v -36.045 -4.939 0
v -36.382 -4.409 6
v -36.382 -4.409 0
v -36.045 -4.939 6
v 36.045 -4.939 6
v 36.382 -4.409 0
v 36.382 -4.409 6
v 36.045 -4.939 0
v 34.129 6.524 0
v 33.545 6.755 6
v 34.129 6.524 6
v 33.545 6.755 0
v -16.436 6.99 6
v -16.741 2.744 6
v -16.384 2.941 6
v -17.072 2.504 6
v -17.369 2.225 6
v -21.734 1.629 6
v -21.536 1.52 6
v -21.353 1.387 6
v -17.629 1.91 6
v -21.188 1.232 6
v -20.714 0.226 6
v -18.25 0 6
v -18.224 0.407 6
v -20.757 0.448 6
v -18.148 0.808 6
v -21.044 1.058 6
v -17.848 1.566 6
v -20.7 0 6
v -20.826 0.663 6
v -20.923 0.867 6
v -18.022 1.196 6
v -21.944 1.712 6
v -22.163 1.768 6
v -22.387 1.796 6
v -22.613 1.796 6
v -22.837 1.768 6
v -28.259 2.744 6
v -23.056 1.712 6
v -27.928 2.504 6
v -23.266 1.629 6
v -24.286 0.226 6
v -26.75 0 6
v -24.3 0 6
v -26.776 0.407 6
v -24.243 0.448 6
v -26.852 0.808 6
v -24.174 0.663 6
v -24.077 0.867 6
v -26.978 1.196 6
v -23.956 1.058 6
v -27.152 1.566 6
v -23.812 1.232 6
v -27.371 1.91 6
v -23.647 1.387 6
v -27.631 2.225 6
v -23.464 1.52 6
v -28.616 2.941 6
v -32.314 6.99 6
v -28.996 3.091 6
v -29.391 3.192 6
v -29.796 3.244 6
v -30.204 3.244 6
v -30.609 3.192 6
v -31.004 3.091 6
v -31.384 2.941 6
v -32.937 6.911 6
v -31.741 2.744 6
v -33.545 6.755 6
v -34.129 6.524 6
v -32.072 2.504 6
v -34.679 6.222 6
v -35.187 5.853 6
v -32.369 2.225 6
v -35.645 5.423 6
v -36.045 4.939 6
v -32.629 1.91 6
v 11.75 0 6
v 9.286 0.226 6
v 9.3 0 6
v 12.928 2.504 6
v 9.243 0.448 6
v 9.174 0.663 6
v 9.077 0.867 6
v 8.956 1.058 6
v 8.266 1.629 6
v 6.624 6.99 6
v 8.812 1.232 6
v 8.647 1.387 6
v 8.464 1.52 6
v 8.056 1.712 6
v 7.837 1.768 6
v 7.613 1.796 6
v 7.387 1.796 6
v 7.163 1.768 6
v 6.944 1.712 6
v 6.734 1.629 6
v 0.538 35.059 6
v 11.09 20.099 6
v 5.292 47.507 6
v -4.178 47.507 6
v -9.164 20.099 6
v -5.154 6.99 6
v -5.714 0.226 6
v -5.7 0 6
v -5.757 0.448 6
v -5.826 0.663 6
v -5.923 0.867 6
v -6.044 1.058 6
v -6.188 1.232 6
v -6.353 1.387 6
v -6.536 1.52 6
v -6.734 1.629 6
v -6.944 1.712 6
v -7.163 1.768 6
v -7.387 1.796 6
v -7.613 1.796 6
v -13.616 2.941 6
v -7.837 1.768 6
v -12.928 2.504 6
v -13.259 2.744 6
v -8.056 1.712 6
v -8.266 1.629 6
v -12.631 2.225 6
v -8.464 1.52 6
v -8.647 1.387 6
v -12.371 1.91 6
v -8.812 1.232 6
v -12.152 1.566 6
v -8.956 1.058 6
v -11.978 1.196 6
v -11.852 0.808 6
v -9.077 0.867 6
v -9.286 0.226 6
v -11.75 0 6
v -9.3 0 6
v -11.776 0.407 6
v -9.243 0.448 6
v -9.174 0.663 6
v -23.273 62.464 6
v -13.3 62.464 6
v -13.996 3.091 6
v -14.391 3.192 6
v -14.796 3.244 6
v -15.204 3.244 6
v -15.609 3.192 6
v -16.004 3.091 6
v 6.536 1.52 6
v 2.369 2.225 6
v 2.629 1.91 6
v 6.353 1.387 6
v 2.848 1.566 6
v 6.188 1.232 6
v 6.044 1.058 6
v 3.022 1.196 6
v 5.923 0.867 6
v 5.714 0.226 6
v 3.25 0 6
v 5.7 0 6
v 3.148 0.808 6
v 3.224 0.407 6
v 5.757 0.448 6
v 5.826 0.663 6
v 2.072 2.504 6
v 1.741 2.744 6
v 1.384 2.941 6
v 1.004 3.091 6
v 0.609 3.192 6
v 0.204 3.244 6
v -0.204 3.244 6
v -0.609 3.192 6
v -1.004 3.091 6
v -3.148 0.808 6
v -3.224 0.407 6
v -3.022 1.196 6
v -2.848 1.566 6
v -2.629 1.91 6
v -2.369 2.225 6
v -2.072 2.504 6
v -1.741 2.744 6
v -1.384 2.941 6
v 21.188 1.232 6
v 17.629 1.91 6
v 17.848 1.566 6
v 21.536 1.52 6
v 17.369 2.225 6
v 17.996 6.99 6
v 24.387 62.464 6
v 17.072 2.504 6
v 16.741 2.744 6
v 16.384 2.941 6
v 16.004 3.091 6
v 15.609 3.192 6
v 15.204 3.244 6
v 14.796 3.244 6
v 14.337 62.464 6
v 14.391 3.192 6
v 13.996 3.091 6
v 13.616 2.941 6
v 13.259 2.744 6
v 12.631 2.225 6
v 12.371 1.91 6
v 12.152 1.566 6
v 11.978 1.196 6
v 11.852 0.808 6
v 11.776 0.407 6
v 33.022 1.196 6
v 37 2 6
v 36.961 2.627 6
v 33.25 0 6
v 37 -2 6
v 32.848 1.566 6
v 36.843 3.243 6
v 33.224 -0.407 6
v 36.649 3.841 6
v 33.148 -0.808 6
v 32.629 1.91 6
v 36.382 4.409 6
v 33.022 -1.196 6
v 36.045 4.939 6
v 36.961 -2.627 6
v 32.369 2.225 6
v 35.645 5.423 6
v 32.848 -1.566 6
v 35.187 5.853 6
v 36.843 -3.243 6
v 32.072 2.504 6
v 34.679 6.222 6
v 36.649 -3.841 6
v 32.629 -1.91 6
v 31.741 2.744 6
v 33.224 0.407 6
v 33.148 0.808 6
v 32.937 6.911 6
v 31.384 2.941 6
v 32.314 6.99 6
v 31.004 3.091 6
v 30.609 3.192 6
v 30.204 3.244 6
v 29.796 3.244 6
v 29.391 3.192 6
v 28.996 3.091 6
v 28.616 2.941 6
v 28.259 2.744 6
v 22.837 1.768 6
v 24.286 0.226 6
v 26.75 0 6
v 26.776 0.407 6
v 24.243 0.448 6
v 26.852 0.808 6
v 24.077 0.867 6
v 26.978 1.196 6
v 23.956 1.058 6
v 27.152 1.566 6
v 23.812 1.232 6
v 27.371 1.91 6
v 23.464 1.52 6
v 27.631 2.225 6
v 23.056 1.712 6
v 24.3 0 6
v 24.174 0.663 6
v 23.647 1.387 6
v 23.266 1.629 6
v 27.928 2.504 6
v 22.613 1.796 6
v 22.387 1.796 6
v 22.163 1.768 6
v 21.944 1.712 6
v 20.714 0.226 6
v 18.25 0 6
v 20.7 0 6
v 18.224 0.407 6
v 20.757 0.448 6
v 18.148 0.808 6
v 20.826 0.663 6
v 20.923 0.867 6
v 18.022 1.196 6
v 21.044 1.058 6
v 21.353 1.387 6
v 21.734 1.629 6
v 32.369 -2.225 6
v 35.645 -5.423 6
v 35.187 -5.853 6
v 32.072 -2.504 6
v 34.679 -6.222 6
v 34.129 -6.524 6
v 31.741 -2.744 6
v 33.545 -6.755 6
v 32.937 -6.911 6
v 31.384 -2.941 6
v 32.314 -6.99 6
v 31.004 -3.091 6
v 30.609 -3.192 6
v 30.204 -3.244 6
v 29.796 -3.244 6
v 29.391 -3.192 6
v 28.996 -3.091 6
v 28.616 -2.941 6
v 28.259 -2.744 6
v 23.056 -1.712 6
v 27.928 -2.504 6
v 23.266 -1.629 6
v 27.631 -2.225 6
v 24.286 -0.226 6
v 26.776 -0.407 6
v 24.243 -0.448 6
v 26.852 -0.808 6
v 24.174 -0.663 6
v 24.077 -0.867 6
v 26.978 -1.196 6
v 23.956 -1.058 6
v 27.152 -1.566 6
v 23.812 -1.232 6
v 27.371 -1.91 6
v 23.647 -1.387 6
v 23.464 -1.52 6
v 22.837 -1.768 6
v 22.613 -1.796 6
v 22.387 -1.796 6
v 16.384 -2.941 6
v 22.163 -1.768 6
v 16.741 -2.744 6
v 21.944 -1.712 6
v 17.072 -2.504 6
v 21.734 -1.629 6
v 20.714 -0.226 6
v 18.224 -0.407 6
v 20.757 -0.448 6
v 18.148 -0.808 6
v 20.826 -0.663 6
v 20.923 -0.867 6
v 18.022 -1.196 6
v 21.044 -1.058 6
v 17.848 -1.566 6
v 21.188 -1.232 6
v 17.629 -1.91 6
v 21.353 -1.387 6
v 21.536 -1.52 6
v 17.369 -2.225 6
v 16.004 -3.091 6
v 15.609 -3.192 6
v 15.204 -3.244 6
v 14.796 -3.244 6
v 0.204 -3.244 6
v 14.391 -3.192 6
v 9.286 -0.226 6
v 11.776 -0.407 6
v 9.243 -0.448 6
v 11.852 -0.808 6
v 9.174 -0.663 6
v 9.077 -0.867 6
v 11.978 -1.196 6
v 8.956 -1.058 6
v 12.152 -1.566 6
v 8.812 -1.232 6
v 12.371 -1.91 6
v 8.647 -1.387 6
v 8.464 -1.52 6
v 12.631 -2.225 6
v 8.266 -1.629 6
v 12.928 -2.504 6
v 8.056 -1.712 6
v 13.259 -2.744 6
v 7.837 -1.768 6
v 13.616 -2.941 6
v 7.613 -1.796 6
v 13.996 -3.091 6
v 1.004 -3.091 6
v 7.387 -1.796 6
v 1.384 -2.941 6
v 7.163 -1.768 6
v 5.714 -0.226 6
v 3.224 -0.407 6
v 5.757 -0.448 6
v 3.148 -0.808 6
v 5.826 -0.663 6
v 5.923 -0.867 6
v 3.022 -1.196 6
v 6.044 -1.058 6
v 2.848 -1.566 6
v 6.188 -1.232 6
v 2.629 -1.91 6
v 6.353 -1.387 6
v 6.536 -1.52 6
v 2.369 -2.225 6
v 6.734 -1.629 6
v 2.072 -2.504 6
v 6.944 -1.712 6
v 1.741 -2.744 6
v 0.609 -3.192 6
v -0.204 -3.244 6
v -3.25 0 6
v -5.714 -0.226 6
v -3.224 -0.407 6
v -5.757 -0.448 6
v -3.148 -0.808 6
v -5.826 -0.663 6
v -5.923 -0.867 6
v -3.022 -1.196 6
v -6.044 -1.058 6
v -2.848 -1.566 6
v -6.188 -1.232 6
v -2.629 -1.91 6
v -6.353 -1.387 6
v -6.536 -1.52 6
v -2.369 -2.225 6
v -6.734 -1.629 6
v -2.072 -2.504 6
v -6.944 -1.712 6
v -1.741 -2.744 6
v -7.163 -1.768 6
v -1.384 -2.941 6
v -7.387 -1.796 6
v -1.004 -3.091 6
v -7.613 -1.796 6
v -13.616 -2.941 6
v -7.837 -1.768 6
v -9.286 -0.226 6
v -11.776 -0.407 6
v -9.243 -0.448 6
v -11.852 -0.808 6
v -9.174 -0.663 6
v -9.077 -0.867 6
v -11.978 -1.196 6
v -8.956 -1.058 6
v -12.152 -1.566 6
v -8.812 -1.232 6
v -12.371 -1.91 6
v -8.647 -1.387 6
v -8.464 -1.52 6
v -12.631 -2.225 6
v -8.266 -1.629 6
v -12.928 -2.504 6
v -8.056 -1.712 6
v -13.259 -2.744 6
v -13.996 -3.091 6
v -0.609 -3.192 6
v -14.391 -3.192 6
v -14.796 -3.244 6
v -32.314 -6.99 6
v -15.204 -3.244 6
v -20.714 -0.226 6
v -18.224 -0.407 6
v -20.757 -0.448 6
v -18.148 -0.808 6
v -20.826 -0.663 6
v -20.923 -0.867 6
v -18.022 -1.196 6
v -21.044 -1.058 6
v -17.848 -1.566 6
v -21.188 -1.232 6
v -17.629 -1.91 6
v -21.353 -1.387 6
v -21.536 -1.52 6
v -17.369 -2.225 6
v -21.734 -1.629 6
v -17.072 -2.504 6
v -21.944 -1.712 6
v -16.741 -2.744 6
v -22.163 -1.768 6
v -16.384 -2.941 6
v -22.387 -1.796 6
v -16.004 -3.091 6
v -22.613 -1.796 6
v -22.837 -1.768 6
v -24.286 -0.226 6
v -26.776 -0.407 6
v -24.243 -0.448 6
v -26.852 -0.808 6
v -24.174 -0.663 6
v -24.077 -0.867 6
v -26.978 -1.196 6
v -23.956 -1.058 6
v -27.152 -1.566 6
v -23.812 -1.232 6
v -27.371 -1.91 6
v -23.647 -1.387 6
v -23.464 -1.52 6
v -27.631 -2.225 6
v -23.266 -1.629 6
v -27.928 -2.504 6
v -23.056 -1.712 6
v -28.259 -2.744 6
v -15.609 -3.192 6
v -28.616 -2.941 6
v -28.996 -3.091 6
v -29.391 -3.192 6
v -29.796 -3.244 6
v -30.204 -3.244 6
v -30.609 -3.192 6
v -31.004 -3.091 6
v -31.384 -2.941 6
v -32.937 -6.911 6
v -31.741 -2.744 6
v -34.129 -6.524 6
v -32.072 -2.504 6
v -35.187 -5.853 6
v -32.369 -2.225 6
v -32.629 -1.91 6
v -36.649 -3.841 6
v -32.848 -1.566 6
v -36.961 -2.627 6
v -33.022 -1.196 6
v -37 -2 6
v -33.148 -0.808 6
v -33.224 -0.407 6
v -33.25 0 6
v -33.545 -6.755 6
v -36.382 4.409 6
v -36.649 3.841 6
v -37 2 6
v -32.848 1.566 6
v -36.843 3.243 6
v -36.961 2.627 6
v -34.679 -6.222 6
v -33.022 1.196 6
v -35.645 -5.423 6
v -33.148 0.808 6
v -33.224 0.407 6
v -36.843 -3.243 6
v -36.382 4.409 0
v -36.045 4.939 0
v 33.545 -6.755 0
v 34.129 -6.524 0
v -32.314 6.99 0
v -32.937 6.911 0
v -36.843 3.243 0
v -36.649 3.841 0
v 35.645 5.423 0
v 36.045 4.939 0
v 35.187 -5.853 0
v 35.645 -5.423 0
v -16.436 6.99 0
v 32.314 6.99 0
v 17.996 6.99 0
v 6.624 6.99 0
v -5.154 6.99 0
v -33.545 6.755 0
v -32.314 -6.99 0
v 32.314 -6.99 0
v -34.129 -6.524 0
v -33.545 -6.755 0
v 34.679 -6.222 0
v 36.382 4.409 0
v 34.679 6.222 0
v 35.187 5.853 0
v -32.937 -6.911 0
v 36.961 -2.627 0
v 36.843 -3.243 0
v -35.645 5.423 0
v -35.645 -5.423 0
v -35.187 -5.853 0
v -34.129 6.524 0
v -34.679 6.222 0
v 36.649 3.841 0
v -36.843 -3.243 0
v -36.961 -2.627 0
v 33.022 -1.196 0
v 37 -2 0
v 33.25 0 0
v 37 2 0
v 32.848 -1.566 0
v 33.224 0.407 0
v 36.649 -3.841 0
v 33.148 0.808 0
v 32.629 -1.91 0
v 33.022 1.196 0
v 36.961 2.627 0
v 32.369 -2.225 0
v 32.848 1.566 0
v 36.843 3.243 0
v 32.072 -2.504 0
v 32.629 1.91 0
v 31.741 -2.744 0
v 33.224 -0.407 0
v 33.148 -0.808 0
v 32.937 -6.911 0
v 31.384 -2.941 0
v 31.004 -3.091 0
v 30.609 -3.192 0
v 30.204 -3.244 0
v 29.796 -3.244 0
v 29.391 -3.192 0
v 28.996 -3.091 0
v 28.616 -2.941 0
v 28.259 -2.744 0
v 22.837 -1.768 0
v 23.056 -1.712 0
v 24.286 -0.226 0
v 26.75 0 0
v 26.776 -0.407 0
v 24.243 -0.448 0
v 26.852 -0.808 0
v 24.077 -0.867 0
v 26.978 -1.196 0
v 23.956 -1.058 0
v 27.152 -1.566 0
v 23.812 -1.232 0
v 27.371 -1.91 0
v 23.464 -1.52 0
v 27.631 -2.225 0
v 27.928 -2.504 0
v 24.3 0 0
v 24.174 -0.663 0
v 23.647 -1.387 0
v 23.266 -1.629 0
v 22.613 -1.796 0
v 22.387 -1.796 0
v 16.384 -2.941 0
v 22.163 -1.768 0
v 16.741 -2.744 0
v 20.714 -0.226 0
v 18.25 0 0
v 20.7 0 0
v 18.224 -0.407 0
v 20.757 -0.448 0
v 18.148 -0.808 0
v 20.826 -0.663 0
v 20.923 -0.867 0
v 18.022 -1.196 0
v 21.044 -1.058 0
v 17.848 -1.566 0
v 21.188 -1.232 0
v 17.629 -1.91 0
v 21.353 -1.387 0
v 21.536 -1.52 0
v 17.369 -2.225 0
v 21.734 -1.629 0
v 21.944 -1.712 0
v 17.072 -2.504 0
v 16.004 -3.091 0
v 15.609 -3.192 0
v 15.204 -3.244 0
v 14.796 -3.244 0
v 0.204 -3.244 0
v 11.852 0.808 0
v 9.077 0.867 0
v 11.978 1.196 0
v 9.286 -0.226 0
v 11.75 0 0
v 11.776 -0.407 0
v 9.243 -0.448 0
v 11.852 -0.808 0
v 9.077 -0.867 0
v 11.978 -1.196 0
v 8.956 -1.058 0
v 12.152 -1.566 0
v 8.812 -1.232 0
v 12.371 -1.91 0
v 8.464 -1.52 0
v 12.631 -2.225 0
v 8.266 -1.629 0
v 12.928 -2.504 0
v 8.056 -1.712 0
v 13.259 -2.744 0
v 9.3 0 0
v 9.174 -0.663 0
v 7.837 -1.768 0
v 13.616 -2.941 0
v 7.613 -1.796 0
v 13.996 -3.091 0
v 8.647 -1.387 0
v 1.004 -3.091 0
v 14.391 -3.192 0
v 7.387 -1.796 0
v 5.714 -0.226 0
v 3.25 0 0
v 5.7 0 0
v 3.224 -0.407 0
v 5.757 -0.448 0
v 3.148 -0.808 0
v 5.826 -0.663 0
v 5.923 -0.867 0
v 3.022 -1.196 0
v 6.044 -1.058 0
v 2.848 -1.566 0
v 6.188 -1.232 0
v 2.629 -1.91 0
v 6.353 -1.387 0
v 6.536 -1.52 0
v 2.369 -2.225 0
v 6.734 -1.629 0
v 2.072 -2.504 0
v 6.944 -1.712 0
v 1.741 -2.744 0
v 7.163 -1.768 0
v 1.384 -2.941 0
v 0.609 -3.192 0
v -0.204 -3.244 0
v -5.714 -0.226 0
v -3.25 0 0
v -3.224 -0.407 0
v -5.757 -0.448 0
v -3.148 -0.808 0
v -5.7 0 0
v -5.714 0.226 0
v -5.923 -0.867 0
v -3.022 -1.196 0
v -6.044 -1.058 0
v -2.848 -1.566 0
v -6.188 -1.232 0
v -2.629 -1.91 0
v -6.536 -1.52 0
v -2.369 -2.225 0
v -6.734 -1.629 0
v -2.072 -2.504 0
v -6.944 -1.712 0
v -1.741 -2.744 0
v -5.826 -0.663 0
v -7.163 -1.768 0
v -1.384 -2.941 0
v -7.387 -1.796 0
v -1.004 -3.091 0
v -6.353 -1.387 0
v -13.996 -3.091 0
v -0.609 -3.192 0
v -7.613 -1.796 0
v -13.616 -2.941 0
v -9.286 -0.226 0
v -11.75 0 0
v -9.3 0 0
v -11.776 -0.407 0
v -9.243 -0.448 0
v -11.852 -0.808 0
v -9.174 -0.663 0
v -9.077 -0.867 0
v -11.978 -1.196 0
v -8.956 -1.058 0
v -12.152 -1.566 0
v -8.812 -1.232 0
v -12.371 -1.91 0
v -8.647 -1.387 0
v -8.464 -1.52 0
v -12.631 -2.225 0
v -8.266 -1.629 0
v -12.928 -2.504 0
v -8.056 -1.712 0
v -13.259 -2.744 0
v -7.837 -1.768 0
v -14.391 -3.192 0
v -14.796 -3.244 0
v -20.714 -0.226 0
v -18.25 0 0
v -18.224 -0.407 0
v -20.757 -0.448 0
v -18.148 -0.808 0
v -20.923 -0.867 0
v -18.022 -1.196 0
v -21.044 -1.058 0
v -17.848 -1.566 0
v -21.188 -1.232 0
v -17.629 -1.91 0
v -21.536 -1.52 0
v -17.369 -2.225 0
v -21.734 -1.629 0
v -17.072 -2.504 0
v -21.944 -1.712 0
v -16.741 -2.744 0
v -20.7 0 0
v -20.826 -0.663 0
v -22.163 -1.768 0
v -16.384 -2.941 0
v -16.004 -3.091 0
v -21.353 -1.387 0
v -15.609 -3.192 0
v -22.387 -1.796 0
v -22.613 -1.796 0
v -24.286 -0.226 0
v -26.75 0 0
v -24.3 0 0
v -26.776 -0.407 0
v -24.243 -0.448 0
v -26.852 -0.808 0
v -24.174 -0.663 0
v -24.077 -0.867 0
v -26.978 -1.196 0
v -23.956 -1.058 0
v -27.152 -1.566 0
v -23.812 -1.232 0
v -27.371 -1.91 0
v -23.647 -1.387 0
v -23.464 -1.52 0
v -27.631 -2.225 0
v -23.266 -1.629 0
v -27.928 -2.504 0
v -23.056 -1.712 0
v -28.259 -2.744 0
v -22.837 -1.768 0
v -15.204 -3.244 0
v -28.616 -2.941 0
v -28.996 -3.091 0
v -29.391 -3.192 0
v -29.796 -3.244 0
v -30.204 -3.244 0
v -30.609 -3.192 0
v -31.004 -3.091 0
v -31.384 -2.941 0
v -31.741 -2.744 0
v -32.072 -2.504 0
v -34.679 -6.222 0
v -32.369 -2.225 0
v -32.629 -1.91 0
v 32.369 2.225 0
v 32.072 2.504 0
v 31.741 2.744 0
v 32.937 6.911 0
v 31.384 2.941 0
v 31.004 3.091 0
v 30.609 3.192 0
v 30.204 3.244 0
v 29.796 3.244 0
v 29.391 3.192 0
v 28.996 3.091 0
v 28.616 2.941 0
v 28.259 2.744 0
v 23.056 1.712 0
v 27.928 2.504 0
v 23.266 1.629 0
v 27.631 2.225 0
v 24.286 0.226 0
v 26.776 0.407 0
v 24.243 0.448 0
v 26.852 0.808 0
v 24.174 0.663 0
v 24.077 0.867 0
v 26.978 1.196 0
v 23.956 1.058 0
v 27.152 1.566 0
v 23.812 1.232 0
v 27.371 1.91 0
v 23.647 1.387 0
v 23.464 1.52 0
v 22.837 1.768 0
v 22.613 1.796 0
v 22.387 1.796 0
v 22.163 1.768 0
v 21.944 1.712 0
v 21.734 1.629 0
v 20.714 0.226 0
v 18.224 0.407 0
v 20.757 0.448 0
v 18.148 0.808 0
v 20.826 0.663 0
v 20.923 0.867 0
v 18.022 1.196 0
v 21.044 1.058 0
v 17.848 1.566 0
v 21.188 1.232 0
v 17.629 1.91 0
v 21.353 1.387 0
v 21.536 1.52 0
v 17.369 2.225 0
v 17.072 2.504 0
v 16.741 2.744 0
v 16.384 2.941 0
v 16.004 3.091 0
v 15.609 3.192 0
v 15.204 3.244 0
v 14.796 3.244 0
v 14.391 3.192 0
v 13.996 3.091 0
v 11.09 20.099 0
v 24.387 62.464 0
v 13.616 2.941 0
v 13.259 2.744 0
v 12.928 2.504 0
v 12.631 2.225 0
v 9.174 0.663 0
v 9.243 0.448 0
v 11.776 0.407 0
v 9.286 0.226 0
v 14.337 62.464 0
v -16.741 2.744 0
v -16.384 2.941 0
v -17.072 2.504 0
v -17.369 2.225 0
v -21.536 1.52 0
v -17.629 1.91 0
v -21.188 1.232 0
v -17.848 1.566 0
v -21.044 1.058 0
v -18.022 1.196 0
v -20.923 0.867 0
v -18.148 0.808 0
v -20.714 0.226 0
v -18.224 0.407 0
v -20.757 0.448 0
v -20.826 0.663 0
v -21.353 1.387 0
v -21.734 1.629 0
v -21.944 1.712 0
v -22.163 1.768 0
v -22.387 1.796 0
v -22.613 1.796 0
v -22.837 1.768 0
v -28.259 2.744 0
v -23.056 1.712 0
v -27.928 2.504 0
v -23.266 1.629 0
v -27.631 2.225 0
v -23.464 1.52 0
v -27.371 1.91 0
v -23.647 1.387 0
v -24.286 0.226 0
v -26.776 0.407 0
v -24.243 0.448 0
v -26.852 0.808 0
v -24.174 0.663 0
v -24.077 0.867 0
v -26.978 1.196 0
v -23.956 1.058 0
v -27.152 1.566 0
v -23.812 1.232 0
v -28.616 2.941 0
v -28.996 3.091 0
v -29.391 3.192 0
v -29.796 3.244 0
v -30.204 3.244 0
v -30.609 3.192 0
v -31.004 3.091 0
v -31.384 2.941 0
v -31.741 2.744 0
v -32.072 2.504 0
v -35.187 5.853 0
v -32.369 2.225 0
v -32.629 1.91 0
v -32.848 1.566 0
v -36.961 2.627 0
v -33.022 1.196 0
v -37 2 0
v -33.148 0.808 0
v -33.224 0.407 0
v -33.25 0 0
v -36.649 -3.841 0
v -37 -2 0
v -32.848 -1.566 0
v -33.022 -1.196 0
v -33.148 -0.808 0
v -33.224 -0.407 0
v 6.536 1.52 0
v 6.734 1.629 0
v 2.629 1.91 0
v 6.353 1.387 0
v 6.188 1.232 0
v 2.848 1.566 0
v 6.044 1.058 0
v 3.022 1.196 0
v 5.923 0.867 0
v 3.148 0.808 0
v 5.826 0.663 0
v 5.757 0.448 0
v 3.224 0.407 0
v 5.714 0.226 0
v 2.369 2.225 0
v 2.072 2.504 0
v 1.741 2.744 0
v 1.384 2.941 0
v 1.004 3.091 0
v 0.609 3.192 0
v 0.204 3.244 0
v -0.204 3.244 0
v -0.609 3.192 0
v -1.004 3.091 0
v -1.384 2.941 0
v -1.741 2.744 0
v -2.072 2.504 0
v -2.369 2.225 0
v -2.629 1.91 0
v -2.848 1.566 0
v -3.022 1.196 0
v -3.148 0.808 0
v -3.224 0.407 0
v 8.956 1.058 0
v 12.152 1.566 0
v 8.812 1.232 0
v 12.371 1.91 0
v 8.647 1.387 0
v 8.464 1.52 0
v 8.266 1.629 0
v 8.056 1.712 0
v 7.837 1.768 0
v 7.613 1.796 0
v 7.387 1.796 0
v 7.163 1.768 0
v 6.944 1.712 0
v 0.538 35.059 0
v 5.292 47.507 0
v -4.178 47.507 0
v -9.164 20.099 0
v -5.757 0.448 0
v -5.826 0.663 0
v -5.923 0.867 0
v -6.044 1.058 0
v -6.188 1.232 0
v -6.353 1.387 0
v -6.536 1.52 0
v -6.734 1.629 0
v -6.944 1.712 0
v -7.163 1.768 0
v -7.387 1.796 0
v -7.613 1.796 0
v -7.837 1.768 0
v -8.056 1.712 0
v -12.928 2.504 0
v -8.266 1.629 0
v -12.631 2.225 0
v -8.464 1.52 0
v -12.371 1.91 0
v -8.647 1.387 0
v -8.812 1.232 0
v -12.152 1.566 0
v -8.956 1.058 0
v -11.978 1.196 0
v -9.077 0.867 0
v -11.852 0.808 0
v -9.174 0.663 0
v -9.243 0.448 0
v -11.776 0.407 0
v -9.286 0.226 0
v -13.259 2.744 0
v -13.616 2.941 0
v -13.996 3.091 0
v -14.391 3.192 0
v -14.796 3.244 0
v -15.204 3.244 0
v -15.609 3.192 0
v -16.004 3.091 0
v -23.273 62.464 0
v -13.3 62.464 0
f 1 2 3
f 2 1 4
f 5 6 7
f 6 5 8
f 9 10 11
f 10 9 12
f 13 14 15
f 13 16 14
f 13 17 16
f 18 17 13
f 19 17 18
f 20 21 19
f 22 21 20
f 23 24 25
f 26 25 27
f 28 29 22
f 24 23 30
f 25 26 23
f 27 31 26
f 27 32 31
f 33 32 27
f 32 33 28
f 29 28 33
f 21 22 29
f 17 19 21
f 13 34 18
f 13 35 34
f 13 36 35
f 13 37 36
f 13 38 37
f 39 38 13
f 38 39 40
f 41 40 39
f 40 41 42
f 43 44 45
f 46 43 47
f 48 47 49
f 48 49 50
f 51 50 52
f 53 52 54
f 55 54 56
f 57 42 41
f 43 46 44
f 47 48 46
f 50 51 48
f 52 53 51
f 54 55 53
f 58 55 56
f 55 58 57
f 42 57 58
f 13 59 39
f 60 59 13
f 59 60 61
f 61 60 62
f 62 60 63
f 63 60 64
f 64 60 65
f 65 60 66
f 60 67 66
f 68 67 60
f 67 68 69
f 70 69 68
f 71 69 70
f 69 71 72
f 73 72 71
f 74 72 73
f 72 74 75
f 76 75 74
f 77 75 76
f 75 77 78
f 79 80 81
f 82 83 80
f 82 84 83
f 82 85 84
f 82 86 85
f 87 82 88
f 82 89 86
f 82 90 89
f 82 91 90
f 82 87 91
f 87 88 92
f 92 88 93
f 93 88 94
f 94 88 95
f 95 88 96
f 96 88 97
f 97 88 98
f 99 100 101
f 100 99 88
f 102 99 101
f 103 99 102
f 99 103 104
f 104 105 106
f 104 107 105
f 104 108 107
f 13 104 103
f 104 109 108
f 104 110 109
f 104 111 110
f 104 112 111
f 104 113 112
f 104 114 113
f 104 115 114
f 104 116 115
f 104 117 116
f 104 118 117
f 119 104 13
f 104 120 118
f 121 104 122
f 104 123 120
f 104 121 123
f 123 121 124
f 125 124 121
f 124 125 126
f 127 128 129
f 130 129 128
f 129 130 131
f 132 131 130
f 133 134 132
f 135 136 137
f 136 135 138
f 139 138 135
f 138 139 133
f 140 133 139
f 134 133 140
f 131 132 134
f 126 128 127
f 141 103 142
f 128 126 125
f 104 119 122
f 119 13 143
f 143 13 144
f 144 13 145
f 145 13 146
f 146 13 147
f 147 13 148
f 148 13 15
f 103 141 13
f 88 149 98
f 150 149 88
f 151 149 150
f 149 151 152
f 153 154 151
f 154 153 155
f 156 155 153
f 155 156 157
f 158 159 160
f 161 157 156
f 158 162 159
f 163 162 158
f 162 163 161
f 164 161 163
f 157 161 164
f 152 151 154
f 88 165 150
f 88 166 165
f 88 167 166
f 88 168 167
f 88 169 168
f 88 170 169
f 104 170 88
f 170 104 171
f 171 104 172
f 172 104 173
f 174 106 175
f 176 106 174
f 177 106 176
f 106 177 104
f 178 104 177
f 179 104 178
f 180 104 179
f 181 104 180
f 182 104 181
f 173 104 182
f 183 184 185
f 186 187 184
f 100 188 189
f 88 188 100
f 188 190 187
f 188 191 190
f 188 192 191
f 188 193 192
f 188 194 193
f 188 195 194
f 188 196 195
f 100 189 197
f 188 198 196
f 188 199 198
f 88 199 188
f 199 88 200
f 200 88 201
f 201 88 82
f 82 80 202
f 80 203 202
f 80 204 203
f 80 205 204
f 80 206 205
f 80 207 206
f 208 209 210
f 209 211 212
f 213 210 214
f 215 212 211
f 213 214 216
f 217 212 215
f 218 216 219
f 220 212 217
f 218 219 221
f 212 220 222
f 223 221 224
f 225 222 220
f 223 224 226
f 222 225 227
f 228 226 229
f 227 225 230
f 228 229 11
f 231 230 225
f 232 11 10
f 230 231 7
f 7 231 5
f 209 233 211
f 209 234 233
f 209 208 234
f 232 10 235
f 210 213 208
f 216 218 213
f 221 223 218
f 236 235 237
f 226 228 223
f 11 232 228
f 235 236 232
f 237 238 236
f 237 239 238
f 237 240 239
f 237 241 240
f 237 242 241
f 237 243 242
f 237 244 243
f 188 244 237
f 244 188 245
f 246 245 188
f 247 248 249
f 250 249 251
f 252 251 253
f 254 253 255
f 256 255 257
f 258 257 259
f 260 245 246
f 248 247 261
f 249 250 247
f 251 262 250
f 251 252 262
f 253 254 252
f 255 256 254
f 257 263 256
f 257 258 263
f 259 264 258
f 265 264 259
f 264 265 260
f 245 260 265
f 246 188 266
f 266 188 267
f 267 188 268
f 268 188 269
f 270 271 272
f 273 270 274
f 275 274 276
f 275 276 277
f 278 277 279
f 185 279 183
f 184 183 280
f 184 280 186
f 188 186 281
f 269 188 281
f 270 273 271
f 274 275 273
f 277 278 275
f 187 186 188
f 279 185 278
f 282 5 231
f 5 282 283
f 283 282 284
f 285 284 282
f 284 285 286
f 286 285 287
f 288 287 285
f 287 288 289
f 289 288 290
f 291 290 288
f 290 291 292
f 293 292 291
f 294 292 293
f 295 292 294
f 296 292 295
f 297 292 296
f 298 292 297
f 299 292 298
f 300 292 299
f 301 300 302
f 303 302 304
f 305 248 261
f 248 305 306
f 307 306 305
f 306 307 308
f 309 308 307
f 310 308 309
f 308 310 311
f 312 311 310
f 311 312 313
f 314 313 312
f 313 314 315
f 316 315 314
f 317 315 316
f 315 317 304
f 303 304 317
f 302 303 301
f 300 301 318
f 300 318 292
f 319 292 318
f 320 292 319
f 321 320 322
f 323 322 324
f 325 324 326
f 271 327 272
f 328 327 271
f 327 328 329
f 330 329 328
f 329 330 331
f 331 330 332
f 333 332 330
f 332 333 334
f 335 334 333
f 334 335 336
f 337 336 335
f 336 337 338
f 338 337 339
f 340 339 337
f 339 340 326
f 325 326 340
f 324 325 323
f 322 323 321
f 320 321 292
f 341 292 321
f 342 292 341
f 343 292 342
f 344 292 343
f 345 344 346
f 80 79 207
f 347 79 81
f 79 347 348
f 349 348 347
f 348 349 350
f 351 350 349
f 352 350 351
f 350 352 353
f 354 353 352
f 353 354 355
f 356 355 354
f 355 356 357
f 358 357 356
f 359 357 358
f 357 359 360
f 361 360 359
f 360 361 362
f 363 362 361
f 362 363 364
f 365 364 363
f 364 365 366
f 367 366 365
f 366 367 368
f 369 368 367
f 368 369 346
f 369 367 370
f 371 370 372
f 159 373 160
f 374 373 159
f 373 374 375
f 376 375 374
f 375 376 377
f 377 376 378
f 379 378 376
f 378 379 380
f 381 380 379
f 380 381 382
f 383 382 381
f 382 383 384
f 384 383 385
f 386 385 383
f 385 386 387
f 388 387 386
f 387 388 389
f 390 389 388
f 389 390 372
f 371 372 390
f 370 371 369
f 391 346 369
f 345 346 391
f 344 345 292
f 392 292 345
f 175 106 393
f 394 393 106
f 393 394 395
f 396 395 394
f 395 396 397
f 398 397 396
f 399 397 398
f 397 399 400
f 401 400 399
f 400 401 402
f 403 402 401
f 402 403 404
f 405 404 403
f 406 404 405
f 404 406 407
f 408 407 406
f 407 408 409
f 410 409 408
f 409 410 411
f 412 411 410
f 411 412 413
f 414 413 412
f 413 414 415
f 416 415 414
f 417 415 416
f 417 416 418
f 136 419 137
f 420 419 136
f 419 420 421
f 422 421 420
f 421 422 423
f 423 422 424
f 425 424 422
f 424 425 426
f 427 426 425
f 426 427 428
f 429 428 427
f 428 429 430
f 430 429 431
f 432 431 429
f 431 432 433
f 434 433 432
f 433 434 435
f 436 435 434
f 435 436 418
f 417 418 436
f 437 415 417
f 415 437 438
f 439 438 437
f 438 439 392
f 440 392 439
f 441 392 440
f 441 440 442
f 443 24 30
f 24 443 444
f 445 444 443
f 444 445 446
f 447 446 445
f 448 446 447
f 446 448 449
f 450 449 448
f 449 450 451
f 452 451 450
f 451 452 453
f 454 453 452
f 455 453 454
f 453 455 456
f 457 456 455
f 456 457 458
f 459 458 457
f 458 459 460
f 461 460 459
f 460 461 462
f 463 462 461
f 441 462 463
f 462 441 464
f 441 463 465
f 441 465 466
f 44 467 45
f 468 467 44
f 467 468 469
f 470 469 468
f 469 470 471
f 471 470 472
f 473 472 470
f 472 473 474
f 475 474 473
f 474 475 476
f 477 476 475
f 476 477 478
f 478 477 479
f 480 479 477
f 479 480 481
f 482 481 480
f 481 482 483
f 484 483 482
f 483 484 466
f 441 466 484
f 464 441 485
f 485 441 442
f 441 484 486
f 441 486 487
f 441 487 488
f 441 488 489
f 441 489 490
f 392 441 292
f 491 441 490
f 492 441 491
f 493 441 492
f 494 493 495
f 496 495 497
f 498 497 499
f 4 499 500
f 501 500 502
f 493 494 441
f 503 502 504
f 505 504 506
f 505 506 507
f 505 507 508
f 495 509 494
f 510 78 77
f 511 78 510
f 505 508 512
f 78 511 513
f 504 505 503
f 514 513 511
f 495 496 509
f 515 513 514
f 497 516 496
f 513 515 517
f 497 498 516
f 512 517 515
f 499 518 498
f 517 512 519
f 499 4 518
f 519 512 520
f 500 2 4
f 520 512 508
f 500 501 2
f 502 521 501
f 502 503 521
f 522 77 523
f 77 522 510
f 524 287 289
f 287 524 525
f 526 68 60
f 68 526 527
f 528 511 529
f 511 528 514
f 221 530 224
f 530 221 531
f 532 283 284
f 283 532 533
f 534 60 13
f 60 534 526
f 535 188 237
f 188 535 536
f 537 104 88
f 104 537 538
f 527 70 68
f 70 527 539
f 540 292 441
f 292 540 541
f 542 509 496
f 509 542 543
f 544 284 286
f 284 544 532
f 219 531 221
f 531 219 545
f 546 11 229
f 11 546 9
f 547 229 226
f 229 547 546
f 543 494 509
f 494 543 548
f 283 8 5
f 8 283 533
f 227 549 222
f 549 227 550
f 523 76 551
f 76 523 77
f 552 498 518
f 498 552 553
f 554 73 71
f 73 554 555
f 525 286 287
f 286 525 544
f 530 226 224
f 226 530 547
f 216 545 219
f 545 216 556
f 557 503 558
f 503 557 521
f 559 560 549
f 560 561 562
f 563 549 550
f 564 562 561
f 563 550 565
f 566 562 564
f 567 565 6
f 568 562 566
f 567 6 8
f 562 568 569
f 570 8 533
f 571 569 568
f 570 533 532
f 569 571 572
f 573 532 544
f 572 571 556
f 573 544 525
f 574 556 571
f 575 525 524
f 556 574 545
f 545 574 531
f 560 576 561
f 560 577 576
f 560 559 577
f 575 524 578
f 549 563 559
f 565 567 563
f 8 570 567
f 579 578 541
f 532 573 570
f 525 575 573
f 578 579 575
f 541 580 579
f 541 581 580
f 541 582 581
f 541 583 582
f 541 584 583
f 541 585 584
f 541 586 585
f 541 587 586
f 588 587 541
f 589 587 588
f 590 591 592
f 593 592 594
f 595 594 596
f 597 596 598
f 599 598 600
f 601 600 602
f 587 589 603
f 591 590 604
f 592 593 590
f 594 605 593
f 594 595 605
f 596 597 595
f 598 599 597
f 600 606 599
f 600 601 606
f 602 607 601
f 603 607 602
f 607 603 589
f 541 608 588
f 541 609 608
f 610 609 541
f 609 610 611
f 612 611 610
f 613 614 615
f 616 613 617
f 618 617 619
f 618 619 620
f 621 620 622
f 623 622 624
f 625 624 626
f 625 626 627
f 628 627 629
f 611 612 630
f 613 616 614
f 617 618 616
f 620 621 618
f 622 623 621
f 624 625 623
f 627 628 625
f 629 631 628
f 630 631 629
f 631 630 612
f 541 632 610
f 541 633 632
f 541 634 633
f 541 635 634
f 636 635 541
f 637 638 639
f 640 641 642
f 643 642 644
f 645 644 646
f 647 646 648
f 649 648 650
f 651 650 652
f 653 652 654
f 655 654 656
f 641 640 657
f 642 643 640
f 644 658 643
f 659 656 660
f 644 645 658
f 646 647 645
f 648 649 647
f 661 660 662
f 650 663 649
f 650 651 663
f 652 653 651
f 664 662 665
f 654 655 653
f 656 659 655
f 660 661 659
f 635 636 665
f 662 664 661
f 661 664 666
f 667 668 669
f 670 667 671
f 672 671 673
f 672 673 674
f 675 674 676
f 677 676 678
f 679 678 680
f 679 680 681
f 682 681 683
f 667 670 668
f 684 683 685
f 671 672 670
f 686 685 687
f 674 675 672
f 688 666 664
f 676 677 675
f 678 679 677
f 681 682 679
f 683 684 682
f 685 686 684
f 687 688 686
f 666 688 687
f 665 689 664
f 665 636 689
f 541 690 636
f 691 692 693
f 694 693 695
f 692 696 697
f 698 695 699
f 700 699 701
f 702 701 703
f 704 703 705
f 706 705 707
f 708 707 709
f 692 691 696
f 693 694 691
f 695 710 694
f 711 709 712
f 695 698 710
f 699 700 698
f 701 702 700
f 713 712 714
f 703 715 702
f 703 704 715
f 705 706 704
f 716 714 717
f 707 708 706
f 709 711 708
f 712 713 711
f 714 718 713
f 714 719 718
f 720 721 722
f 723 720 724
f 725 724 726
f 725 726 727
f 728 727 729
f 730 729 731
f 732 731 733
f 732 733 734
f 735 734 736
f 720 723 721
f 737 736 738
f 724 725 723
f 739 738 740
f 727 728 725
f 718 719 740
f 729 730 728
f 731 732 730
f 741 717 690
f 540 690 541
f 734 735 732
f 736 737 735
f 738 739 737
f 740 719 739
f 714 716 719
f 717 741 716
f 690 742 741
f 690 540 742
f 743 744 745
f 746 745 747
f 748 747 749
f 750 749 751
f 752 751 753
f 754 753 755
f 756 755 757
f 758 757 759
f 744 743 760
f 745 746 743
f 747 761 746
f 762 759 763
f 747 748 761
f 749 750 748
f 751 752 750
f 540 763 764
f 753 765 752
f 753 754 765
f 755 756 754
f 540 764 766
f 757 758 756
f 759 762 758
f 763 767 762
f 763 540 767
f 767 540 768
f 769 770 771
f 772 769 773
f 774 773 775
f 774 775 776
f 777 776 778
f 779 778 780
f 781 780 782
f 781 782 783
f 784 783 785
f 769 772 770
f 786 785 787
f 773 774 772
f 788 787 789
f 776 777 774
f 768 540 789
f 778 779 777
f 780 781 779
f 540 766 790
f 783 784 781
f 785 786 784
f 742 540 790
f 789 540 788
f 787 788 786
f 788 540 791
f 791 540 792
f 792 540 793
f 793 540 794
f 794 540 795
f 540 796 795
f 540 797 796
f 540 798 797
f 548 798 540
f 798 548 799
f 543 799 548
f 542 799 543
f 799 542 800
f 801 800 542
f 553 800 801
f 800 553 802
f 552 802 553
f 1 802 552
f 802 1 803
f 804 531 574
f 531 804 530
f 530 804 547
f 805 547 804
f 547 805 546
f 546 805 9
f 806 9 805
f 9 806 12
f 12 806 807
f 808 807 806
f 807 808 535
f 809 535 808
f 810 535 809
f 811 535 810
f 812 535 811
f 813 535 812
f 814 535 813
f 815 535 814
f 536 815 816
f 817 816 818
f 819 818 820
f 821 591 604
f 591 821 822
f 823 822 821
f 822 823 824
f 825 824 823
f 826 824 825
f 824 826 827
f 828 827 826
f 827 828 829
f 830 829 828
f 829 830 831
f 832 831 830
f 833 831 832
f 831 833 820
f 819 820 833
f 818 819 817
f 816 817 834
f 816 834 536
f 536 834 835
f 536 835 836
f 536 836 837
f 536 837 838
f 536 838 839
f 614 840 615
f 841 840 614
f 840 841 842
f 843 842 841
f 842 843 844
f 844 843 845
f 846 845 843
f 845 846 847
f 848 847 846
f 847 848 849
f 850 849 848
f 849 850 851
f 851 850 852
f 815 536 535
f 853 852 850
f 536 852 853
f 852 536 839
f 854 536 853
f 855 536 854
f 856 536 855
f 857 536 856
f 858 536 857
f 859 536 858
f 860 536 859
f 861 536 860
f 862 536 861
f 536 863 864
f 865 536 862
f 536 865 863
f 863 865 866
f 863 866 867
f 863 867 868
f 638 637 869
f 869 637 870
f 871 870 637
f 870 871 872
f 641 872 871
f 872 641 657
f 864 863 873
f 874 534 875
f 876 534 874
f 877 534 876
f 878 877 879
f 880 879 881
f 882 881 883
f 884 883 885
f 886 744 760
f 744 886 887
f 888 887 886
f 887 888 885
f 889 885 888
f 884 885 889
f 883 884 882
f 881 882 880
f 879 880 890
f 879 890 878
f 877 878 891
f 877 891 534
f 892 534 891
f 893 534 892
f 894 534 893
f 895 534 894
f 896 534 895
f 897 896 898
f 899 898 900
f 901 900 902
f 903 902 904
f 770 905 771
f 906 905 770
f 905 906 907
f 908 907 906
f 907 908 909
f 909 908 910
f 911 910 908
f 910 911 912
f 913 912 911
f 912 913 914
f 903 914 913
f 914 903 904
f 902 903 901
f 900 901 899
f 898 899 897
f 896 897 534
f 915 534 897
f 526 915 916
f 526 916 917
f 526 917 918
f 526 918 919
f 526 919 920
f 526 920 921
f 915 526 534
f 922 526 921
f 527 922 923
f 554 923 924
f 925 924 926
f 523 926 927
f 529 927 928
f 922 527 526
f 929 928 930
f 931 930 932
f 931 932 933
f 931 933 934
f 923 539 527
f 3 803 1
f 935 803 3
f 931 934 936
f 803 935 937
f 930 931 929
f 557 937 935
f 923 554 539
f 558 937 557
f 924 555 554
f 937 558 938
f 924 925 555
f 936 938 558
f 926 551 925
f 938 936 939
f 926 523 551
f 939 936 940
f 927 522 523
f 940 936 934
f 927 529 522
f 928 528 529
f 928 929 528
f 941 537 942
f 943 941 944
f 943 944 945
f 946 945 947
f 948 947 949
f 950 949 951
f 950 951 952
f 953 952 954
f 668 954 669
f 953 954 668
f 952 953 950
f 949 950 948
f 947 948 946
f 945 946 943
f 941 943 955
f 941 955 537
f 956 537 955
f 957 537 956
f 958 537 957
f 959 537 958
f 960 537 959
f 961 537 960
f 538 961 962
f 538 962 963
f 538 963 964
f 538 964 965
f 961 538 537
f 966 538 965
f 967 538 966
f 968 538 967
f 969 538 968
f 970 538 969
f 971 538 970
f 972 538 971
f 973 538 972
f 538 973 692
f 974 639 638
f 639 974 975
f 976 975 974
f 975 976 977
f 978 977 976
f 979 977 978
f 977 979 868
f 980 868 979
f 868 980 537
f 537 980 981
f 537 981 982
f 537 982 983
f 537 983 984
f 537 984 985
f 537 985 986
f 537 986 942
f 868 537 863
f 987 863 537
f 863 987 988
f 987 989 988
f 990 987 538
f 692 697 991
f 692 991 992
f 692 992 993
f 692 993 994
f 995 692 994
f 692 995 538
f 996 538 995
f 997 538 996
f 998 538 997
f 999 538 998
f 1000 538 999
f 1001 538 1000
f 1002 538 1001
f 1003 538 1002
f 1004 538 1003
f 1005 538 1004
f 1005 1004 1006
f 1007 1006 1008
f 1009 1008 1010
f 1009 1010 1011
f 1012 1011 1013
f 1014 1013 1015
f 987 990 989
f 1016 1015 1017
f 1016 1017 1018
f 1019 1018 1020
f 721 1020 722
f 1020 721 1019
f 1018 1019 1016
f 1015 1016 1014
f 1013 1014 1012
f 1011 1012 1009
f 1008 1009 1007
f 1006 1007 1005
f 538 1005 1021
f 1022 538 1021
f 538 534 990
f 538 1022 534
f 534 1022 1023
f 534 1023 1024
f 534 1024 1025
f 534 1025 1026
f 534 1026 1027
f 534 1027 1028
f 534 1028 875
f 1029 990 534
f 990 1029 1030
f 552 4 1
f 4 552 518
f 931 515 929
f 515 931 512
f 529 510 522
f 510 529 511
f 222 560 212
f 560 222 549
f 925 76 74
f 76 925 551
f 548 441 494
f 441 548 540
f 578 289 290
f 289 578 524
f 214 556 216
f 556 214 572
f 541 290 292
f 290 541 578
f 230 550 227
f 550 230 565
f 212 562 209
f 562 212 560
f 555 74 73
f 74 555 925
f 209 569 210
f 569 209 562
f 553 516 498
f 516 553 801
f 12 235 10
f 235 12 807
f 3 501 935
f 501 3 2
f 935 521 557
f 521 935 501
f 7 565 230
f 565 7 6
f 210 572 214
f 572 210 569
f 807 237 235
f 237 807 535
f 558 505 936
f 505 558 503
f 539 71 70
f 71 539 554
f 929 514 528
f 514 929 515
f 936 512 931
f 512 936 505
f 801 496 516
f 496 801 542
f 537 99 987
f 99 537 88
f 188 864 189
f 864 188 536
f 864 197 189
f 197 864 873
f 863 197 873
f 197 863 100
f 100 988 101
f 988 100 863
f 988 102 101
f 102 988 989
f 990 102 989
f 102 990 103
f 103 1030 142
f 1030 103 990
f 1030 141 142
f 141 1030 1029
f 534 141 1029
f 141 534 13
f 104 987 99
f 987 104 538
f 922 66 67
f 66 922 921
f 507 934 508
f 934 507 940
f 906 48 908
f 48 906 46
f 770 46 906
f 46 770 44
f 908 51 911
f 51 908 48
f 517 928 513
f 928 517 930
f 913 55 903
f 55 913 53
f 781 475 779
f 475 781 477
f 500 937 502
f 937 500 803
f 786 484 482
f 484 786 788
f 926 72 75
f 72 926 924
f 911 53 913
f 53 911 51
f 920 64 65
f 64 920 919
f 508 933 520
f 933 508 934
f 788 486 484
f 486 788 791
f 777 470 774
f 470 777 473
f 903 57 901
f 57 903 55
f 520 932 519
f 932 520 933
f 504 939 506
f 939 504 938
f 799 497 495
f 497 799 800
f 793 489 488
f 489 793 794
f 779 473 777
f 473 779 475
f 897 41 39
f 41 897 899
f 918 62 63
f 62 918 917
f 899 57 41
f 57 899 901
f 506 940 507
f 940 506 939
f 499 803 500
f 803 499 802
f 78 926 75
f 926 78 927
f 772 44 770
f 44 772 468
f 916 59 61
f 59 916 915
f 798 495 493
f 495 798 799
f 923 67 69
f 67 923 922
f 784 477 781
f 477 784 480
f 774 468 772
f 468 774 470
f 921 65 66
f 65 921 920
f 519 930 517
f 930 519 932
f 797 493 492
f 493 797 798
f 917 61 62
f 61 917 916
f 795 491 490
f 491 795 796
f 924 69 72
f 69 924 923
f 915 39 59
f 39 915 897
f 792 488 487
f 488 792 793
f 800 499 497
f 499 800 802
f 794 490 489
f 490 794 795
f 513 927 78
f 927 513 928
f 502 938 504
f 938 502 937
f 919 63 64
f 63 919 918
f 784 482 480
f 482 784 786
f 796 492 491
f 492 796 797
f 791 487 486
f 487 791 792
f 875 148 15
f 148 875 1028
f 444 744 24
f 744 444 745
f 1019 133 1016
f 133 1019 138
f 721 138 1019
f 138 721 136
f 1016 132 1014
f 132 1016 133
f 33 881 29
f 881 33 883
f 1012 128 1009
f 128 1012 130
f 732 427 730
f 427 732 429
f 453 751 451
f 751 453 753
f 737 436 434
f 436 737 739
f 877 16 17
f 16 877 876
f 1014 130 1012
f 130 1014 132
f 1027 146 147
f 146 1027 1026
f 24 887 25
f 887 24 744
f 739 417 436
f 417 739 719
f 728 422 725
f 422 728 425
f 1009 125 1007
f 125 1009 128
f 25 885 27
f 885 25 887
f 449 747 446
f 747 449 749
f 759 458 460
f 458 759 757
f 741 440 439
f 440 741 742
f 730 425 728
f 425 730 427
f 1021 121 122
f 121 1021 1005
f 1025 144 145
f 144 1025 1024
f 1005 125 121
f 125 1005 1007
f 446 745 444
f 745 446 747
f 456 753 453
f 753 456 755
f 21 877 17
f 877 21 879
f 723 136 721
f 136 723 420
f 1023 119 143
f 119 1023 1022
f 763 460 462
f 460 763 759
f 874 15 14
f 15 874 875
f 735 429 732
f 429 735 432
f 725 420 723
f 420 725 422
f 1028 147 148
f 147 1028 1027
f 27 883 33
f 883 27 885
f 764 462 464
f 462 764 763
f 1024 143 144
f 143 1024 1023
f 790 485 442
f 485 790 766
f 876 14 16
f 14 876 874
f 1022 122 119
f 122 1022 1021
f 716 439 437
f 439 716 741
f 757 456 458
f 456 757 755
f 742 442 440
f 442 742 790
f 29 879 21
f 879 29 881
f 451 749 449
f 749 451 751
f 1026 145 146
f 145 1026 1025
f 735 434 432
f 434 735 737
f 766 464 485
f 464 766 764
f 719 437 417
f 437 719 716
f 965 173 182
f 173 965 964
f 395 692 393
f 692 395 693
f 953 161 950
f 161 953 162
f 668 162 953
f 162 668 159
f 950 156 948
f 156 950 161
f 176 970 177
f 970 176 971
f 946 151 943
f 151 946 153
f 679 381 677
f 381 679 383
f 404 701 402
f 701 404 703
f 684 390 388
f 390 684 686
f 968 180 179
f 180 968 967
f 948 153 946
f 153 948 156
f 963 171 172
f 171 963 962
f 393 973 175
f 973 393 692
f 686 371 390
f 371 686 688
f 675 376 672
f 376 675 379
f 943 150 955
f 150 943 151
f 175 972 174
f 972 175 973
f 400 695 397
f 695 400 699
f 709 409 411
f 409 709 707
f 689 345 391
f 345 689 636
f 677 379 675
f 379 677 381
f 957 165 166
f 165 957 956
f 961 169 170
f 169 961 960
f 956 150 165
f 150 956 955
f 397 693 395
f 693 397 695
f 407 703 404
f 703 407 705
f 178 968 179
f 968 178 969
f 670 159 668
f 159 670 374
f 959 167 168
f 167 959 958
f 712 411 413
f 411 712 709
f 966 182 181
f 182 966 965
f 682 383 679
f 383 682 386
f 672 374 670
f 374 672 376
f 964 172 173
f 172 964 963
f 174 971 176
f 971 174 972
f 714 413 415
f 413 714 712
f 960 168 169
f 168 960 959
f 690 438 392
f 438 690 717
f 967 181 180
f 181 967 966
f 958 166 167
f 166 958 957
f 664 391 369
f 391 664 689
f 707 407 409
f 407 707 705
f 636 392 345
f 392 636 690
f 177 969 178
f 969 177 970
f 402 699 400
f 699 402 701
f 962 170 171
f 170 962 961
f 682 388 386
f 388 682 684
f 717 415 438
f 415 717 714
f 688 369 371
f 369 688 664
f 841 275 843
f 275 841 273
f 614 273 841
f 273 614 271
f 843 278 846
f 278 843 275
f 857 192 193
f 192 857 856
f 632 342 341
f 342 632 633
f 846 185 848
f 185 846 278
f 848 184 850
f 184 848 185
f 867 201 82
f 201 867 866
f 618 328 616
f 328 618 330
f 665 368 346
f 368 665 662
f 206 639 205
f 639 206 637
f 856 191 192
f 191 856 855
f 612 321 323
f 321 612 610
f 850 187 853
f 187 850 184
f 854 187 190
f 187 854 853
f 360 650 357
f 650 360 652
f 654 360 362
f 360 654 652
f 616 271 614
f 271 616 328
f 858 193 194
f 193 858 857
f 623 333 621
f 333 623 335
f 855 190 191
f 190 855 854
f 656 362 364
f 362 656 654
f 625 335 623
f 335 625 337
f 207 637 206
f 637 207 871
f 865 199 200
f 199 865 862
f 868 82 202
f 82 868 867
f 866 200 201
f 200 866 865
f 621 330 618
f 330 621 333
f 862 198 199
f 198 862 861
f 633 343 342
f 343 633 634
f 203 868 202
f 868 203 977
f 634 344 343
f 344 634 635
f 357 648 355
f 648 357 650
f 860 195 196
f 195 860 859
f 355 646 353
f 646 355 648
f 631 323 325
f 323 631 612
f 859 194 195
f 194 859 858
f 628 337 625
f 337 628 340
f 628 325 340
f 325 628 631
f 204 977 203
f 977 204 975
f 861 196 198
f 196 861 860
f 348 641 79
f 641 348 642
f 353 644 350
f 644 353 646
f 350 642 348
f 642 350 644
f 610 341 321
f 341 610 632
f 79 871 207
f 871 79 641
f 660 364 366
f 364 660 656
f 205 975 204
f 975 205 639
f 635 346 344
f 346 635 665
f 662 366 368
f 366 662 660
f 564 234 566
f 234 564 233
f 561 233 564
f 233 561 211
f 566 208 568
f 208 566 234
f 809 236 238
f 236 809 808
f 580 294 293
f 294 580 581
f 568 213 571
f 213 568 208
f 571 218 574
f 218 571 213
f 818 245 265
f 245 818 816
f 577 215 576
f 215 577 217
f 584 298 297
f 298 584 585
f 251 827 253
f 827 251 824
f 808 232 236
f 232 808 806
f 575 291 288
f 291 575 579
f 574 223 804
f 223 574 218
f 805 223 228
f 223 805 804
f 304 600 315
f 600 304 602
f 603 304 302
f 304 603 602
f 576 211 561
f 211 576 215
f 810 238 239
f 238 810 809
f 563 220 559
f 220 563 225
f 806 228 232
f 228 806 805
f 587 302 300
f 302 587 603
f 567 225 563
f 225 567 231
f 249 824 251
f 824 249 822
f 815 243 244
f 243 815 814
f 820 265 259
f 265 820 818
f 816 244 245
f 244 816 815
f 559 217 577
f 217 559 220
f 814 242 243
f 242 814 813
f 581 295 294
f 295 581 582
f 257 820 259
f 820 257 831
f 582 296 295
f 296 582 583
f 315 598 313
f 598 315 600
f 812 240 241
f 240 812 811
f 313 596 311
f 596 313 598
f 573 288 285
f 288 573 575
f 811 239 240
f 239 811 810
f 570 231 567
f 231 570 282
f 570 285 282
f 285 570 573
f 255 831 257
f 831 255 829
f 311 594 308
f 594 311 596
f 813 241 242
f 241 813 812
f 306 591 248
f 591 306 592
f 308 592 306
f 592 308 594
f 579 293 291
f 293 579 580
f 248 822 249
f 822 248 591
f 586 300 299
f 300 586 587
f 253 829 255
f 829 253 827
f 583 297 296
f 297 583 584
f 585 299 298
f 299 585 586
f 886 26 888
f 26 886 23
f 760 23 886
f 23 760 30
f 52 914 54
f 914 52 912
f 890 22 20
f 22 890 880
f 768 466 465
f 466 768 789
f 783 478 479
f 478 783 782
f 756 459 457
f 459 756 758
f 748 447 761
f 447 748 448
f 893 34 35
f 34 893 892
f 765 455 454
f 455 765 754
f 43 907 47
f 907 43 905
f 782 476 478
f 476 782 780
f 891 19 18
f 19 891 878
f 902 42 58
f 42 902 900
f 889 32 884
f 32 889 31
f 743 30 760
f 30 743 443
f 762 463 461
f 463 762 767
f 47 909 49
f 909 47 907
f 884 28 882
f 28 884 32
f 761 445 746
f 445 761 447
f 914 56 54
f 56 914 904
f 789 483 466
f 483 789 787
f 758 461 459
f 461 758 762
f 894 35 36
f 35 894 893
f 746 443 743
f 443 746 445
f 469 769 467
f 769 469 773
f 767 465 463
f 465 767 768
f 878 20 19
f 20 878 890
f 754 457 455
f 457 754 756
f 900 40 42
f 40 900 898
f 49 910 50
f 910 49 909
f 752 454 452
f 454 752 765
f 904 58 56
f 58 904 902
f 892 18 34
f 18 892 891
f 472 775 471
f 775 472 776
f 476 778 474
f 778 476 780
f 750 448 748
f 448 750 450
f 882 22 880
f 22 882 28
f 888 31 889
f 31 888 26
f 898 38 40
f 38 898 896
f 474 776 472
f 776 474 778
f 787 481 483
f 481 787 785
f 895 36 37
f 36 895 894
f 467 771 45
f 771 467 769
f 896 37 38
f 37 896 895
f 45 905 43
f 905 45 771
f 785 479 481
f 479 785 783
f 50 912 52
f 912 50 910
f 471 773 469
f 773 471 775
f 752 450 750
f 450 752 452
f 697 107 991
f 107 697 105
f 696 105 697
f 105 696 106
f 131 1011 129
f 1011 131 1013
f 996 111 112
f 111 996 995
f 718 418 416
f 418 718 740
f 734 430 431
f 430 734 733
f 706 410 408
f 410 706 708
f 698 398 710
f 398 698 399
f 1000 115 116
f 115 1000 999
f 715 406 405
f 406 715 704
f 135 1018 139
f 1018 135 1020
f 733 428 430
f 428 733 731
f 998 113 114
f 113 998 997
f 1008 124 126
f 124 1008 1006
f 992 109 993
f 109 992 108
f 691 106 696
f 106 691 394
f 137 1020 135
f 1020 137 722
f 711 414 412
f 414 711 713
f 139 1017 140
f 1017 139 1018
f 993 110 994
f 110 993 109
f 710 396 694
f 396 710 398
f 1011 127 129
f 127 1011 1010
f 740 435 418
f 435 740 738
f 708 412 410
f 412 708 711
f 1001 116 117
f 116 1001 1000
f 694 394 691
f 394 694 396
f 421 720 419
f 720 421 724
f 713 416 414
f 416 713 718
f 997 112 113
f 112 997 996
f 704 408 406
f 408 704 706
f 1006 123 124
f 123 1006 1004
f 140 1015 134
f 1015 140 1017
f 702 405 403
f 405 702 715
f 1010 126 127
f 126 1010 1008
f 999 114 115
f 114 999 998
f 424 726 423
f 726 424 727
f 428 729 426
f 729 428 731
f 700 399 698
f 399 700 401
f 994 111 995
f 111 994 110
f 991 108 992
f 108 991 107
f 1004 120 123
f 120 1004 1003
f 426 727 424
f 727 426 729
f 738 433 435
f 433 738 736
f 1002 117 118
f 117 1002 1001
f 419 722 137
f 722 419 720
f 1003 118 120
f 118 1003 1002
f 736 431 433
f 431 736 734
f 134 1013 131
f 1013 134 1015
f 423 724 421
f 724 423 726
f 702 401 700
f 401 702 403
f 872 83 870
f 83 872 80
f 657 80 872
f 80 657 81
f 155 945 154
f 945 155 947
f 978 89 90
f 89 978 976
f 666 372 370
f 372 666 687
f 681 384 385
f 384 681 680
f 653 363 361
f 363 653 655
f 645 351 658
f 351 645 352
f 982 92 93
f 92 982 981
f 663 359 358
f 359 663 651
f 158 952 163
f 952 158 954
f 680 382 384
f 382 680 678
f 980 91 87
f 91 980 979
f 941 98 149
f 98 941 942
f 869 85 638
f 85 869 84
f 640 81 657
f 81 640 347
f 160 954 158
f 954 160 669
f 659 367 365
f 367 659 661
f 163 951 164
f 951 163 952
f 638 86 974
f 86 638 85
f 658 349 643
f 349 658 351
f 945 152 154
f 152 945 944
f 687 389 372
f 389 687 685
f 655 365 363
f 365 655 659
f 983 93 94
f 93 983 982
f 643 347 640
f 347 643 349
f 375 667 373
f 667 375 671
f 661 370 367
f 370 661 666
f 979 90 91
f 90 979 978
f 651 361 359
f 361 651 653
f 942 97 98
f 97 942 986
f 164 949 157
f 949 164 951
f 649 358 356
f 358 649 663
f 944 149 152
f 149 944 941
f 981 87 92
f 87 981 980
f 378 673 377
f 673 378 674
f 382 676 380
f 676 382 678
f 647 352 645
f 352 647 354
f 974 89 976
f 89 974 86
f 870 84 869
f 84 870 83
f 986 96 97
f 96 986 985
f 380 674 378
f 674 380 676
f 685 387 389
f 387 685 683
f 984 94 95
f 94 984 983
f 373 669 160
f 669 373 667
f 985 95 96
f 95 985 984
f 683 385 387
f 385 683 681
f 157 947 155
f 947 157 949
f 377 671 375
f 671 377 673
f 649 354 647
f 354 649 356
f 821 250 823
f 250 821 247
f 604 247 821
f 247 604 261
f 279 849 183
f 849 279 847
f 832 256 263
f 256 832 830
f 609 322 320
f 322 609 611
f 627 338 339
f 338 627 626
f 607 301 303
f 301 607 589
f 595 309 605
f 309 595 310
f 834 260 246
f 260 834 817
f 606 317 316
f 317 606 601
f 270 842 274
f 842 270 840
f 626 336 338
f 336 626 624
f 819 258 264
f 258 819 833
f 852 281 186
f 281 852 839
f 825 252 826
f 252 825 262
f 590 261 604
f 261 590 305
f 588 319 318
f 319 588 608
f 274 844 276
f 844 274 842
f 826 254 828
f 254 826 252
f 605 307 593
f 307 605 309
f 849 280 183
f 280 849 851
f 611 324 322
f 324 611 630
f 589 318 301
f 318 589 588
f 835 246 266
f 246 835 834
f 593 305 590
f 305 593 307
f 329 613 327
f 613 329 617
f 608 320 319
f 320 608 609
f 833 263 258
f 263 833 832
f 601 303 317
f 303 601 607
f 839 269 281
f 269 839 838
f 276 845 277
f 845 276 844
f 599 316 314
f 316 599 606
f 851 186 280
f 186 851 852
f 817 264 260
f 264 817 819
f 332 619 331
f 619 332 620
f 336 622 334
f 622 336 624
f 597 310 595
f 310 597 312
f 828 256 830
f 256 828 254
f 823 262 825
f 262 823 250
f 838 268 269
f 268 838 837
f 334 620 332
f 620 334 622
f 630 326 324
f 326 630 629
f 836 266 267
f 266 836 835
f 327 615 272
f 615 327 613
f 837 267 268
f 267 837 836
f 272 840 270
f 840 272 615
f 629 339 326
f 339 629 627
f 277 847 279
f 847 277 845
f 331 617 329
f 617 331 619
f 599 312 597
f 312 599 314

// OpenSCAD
$fn = 50;


difference() {
	union() {
		hull() {
			translate(v = [-32.0000000000, 2.0000000000, 0]) {
				cylinder(h = 6, r = 5);
			}
			translate(v = [32.0000000000, 2.0000000000, 0]) {
				cylinder(h = 6, r = 5);
			}
			translate(v = [-32.0000000000, -2.0000000000, 0]) {
				cylinder(h = 6, r = 5);
			}
			translate(v = [32.0000000000, -2.0000000000, 0]) {
				cylinder(h = 6, r = 5);
			}
		}
		translate(v = [0, 61.1111111111, 0]) {
			linear_extrude(height = 6) {
				text(font = "DejaVu Sans Mono:style=Bold", halign = "center", size = 57.0000000000, text = "W", valign = "top");
			}
		}
	}
	union() {
		translate(v = [-30.0000000000, 0.0000000000, 0]) {
			translate(v = [0, 0, -100]) {
				cylinder(h = 200, r = 3.2500000000);
			}
		}
		translate(v = [-15.0000000000, 0.0000000000, 0]) {
			translate(v = [0, 0, -100]) {
				cylinder(h = 200, r = 3.2500000000);
			}
		}
		translate(v = [0, 0, -100]) {
			cylinder(h = 200, r = 3.2500000000);
		}
		translate(v = [15.0000000000, 0.0000000000, 0]) {
			translate(v = [0, 0, -100]) {
				cylinder(h = 200, r = 3.2500000000);
			}
		}
		translate(v = [30.0000000000, 0.0000000000, 0]) {
			translate(v = [0, 0, -100]) {
				cylinder(h = 200, r = 3.2500000000);
			}
		}
		translate(v = [-30.0000000000, 0.0000000000, 0]) {
			translate(v = [0, 0, -100]) {
				cylinder(h = 200, r = 1.8000000000);
			}
		}
		translate(v = [-22.5000000000, 0.0000000000, 0]) {
			translate(v = [0, 0, -100]) {
				cylinder(h = 200, r = 1.8000000000);
			}
		}
		translate(v = [-15.0000000000, 0.0000000000, 0]) {
			translate(v = [0, 0, -100]) {
				cylinder(h = 200, r = 1.8000000000);
			}
		}
		translate(v = [-7.5000000000, 0.0000000000, 0]) {
			translate(v = [0, 0, -100]) {
				cylinder(h = 200, r = 1.8000000000);
			}
		}
		translate(v = [0, 0, -100]) {
			cylinder(h = 200, r = 1.8000000000);
		}
		translate(v = [7.5000000000, 0.0000000000, 0]) {
			translate(v = [0, 0, -100]) {
				cylinder(h = 200, r = 1.8000000000);
			}
		}
		translate(v = [15.0000000000, 0.0000000000, 0]) {
			translate(v = [0, 0, -100]) {
				cylinder(h = 200, r = 1.8000000000);
			}
		}
		translate(v = [22.5000000000, 0.0000000000, 0]) {
			translate(v = [0, 0, -100]) {
				cylinder(h = 200, r = 1.8000000000);
			}
		}
		translate(v = [30.0000000000, 0.0000000000, 0]) {
			translate(v = [0, 0, -100]) {
				cylinder(h = 200, r = 1.8000000000);
			}
		}
	}
}
